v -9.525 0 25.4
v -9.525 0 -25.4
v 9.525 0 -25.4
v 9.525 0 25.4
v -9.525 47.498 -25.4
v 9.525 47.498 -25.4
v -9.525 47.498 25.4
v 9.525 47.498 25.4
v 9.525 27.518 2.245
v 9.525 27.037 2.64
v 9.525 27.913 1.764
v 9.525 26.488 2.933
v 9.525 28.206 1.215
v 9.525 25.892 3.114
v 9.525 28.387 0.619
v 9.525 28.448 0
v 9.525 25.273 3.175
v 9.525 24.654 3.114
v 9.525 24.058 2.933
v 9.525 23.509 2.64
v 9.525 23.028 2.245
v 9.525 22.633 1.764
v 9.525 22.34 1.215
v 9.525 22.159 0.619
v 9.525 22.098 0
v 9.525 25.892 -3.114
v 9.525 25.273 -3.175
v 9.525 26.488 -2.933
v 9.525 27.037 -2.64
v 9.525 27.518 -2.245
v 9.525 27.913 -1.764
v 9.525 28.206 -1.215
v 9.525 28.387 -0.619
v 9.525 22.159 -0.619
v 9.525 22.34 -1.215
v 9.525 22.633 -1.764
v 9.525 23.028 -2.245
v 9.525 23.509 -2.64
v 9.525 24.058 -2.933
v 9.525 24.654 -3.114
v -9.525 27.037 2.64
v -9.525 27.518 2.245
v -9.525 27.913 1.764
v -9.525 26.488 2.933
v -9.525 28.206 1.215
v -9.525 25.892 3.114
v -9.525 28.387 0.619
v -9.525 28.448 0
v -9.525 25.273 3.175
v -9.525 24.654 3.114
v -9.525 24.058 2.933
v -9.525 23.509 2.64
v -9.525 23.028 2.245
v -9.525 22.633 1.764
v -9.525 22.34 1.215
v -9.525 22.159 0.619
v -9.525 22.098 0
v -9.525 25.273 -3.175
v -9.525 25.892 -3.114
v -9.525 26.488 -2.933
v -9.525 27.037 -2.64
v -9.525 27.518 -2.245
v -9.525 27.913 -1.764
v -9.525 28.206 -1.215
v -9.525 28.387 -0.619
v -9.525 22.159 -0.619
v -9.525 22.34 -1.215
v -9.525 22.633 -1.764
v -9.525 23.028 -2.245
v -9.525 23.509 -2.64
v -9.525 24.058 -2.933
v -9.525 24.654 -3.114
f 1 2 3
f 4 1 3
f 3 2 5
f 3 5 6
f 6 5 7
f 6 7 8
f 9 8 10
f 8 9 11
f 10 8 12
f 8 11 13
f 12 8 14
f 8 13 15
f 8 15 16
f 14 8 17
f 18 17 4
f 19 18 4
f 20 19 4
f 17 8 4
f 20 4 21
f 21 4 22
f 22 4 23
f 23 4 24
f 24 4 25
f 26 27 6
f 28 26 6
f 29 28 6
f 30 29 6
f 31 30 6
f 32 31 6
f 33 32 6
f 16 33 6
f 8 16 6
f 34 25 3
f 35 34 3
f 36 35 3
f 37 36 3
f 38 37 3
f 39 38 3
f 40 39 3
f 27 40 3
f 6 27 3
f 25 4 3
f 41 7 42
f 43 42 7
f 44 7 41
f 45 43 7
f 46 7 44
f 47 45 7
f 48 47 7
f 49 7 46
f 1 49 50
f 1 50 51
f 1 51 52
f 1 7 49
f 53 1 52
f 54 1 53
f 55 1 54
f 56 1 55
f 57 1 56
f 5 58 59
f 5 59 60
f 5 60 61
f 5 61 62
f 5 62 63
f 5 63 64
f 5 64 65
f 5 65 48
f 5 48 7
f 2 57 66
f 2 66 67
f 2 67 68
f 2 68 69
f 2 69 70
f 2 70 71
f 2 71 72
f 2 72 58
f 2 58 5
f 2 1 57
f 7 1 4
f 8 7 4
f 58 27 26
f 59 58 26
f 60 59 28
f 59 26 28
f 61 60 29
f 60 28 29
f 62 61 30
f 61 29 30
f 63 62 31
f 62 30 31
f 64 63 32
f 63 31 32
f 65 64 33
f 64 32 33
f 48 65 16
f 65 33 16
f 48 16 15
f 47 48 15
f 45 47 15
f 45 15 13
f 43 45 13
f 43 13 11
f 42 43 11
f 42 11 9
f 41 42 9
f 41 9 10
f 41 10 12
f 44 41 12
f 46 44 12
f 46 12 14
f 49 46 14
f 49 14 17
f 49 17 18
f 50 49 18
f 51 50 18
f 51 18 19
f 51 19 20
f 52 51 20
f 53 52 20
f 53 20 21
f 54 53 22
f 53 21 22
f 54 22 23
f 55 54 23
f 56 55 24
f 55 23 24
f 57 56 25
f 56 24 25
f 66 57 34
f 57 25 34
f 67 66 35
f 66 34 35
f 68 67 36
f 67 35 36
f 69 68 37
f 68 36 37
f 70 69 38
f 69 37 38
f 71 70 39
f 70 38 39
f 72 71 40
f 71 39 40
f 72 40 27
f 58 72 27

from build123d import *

# Parameters (mm, degrees)
SKETCH1_W                  = 19.05
SKETCH1_H                  = 50.8
BOSS_EXTRUDE1_DEPTH        = 47.498
F_1_4_0_2500_DOWEL_HOLE1_D = 6.35


with BuildPart() as part:
    # Sketch1 → Boss-Extrude1 (new body)
    with BuildSketch(Plane(origin=(0, 0, 0), x_dir=(1, 0, 0), z_dir=(0, 1, 0))):
        Rectangle(SKETCH1_W, SKETCH1_H)
    extrude(amount=BOSS_EXTRUDE1_DEPTH)

    # 1/4 (0.2500) Dowel Hole1 (through all)
    with Locations(Plane.ZY.offset(9.525)):
        with Locations((0, 25.273)):
            Hole(F_1_4_0_2500_DOWEL_HOLE1_D / 2)


solid = part.part
